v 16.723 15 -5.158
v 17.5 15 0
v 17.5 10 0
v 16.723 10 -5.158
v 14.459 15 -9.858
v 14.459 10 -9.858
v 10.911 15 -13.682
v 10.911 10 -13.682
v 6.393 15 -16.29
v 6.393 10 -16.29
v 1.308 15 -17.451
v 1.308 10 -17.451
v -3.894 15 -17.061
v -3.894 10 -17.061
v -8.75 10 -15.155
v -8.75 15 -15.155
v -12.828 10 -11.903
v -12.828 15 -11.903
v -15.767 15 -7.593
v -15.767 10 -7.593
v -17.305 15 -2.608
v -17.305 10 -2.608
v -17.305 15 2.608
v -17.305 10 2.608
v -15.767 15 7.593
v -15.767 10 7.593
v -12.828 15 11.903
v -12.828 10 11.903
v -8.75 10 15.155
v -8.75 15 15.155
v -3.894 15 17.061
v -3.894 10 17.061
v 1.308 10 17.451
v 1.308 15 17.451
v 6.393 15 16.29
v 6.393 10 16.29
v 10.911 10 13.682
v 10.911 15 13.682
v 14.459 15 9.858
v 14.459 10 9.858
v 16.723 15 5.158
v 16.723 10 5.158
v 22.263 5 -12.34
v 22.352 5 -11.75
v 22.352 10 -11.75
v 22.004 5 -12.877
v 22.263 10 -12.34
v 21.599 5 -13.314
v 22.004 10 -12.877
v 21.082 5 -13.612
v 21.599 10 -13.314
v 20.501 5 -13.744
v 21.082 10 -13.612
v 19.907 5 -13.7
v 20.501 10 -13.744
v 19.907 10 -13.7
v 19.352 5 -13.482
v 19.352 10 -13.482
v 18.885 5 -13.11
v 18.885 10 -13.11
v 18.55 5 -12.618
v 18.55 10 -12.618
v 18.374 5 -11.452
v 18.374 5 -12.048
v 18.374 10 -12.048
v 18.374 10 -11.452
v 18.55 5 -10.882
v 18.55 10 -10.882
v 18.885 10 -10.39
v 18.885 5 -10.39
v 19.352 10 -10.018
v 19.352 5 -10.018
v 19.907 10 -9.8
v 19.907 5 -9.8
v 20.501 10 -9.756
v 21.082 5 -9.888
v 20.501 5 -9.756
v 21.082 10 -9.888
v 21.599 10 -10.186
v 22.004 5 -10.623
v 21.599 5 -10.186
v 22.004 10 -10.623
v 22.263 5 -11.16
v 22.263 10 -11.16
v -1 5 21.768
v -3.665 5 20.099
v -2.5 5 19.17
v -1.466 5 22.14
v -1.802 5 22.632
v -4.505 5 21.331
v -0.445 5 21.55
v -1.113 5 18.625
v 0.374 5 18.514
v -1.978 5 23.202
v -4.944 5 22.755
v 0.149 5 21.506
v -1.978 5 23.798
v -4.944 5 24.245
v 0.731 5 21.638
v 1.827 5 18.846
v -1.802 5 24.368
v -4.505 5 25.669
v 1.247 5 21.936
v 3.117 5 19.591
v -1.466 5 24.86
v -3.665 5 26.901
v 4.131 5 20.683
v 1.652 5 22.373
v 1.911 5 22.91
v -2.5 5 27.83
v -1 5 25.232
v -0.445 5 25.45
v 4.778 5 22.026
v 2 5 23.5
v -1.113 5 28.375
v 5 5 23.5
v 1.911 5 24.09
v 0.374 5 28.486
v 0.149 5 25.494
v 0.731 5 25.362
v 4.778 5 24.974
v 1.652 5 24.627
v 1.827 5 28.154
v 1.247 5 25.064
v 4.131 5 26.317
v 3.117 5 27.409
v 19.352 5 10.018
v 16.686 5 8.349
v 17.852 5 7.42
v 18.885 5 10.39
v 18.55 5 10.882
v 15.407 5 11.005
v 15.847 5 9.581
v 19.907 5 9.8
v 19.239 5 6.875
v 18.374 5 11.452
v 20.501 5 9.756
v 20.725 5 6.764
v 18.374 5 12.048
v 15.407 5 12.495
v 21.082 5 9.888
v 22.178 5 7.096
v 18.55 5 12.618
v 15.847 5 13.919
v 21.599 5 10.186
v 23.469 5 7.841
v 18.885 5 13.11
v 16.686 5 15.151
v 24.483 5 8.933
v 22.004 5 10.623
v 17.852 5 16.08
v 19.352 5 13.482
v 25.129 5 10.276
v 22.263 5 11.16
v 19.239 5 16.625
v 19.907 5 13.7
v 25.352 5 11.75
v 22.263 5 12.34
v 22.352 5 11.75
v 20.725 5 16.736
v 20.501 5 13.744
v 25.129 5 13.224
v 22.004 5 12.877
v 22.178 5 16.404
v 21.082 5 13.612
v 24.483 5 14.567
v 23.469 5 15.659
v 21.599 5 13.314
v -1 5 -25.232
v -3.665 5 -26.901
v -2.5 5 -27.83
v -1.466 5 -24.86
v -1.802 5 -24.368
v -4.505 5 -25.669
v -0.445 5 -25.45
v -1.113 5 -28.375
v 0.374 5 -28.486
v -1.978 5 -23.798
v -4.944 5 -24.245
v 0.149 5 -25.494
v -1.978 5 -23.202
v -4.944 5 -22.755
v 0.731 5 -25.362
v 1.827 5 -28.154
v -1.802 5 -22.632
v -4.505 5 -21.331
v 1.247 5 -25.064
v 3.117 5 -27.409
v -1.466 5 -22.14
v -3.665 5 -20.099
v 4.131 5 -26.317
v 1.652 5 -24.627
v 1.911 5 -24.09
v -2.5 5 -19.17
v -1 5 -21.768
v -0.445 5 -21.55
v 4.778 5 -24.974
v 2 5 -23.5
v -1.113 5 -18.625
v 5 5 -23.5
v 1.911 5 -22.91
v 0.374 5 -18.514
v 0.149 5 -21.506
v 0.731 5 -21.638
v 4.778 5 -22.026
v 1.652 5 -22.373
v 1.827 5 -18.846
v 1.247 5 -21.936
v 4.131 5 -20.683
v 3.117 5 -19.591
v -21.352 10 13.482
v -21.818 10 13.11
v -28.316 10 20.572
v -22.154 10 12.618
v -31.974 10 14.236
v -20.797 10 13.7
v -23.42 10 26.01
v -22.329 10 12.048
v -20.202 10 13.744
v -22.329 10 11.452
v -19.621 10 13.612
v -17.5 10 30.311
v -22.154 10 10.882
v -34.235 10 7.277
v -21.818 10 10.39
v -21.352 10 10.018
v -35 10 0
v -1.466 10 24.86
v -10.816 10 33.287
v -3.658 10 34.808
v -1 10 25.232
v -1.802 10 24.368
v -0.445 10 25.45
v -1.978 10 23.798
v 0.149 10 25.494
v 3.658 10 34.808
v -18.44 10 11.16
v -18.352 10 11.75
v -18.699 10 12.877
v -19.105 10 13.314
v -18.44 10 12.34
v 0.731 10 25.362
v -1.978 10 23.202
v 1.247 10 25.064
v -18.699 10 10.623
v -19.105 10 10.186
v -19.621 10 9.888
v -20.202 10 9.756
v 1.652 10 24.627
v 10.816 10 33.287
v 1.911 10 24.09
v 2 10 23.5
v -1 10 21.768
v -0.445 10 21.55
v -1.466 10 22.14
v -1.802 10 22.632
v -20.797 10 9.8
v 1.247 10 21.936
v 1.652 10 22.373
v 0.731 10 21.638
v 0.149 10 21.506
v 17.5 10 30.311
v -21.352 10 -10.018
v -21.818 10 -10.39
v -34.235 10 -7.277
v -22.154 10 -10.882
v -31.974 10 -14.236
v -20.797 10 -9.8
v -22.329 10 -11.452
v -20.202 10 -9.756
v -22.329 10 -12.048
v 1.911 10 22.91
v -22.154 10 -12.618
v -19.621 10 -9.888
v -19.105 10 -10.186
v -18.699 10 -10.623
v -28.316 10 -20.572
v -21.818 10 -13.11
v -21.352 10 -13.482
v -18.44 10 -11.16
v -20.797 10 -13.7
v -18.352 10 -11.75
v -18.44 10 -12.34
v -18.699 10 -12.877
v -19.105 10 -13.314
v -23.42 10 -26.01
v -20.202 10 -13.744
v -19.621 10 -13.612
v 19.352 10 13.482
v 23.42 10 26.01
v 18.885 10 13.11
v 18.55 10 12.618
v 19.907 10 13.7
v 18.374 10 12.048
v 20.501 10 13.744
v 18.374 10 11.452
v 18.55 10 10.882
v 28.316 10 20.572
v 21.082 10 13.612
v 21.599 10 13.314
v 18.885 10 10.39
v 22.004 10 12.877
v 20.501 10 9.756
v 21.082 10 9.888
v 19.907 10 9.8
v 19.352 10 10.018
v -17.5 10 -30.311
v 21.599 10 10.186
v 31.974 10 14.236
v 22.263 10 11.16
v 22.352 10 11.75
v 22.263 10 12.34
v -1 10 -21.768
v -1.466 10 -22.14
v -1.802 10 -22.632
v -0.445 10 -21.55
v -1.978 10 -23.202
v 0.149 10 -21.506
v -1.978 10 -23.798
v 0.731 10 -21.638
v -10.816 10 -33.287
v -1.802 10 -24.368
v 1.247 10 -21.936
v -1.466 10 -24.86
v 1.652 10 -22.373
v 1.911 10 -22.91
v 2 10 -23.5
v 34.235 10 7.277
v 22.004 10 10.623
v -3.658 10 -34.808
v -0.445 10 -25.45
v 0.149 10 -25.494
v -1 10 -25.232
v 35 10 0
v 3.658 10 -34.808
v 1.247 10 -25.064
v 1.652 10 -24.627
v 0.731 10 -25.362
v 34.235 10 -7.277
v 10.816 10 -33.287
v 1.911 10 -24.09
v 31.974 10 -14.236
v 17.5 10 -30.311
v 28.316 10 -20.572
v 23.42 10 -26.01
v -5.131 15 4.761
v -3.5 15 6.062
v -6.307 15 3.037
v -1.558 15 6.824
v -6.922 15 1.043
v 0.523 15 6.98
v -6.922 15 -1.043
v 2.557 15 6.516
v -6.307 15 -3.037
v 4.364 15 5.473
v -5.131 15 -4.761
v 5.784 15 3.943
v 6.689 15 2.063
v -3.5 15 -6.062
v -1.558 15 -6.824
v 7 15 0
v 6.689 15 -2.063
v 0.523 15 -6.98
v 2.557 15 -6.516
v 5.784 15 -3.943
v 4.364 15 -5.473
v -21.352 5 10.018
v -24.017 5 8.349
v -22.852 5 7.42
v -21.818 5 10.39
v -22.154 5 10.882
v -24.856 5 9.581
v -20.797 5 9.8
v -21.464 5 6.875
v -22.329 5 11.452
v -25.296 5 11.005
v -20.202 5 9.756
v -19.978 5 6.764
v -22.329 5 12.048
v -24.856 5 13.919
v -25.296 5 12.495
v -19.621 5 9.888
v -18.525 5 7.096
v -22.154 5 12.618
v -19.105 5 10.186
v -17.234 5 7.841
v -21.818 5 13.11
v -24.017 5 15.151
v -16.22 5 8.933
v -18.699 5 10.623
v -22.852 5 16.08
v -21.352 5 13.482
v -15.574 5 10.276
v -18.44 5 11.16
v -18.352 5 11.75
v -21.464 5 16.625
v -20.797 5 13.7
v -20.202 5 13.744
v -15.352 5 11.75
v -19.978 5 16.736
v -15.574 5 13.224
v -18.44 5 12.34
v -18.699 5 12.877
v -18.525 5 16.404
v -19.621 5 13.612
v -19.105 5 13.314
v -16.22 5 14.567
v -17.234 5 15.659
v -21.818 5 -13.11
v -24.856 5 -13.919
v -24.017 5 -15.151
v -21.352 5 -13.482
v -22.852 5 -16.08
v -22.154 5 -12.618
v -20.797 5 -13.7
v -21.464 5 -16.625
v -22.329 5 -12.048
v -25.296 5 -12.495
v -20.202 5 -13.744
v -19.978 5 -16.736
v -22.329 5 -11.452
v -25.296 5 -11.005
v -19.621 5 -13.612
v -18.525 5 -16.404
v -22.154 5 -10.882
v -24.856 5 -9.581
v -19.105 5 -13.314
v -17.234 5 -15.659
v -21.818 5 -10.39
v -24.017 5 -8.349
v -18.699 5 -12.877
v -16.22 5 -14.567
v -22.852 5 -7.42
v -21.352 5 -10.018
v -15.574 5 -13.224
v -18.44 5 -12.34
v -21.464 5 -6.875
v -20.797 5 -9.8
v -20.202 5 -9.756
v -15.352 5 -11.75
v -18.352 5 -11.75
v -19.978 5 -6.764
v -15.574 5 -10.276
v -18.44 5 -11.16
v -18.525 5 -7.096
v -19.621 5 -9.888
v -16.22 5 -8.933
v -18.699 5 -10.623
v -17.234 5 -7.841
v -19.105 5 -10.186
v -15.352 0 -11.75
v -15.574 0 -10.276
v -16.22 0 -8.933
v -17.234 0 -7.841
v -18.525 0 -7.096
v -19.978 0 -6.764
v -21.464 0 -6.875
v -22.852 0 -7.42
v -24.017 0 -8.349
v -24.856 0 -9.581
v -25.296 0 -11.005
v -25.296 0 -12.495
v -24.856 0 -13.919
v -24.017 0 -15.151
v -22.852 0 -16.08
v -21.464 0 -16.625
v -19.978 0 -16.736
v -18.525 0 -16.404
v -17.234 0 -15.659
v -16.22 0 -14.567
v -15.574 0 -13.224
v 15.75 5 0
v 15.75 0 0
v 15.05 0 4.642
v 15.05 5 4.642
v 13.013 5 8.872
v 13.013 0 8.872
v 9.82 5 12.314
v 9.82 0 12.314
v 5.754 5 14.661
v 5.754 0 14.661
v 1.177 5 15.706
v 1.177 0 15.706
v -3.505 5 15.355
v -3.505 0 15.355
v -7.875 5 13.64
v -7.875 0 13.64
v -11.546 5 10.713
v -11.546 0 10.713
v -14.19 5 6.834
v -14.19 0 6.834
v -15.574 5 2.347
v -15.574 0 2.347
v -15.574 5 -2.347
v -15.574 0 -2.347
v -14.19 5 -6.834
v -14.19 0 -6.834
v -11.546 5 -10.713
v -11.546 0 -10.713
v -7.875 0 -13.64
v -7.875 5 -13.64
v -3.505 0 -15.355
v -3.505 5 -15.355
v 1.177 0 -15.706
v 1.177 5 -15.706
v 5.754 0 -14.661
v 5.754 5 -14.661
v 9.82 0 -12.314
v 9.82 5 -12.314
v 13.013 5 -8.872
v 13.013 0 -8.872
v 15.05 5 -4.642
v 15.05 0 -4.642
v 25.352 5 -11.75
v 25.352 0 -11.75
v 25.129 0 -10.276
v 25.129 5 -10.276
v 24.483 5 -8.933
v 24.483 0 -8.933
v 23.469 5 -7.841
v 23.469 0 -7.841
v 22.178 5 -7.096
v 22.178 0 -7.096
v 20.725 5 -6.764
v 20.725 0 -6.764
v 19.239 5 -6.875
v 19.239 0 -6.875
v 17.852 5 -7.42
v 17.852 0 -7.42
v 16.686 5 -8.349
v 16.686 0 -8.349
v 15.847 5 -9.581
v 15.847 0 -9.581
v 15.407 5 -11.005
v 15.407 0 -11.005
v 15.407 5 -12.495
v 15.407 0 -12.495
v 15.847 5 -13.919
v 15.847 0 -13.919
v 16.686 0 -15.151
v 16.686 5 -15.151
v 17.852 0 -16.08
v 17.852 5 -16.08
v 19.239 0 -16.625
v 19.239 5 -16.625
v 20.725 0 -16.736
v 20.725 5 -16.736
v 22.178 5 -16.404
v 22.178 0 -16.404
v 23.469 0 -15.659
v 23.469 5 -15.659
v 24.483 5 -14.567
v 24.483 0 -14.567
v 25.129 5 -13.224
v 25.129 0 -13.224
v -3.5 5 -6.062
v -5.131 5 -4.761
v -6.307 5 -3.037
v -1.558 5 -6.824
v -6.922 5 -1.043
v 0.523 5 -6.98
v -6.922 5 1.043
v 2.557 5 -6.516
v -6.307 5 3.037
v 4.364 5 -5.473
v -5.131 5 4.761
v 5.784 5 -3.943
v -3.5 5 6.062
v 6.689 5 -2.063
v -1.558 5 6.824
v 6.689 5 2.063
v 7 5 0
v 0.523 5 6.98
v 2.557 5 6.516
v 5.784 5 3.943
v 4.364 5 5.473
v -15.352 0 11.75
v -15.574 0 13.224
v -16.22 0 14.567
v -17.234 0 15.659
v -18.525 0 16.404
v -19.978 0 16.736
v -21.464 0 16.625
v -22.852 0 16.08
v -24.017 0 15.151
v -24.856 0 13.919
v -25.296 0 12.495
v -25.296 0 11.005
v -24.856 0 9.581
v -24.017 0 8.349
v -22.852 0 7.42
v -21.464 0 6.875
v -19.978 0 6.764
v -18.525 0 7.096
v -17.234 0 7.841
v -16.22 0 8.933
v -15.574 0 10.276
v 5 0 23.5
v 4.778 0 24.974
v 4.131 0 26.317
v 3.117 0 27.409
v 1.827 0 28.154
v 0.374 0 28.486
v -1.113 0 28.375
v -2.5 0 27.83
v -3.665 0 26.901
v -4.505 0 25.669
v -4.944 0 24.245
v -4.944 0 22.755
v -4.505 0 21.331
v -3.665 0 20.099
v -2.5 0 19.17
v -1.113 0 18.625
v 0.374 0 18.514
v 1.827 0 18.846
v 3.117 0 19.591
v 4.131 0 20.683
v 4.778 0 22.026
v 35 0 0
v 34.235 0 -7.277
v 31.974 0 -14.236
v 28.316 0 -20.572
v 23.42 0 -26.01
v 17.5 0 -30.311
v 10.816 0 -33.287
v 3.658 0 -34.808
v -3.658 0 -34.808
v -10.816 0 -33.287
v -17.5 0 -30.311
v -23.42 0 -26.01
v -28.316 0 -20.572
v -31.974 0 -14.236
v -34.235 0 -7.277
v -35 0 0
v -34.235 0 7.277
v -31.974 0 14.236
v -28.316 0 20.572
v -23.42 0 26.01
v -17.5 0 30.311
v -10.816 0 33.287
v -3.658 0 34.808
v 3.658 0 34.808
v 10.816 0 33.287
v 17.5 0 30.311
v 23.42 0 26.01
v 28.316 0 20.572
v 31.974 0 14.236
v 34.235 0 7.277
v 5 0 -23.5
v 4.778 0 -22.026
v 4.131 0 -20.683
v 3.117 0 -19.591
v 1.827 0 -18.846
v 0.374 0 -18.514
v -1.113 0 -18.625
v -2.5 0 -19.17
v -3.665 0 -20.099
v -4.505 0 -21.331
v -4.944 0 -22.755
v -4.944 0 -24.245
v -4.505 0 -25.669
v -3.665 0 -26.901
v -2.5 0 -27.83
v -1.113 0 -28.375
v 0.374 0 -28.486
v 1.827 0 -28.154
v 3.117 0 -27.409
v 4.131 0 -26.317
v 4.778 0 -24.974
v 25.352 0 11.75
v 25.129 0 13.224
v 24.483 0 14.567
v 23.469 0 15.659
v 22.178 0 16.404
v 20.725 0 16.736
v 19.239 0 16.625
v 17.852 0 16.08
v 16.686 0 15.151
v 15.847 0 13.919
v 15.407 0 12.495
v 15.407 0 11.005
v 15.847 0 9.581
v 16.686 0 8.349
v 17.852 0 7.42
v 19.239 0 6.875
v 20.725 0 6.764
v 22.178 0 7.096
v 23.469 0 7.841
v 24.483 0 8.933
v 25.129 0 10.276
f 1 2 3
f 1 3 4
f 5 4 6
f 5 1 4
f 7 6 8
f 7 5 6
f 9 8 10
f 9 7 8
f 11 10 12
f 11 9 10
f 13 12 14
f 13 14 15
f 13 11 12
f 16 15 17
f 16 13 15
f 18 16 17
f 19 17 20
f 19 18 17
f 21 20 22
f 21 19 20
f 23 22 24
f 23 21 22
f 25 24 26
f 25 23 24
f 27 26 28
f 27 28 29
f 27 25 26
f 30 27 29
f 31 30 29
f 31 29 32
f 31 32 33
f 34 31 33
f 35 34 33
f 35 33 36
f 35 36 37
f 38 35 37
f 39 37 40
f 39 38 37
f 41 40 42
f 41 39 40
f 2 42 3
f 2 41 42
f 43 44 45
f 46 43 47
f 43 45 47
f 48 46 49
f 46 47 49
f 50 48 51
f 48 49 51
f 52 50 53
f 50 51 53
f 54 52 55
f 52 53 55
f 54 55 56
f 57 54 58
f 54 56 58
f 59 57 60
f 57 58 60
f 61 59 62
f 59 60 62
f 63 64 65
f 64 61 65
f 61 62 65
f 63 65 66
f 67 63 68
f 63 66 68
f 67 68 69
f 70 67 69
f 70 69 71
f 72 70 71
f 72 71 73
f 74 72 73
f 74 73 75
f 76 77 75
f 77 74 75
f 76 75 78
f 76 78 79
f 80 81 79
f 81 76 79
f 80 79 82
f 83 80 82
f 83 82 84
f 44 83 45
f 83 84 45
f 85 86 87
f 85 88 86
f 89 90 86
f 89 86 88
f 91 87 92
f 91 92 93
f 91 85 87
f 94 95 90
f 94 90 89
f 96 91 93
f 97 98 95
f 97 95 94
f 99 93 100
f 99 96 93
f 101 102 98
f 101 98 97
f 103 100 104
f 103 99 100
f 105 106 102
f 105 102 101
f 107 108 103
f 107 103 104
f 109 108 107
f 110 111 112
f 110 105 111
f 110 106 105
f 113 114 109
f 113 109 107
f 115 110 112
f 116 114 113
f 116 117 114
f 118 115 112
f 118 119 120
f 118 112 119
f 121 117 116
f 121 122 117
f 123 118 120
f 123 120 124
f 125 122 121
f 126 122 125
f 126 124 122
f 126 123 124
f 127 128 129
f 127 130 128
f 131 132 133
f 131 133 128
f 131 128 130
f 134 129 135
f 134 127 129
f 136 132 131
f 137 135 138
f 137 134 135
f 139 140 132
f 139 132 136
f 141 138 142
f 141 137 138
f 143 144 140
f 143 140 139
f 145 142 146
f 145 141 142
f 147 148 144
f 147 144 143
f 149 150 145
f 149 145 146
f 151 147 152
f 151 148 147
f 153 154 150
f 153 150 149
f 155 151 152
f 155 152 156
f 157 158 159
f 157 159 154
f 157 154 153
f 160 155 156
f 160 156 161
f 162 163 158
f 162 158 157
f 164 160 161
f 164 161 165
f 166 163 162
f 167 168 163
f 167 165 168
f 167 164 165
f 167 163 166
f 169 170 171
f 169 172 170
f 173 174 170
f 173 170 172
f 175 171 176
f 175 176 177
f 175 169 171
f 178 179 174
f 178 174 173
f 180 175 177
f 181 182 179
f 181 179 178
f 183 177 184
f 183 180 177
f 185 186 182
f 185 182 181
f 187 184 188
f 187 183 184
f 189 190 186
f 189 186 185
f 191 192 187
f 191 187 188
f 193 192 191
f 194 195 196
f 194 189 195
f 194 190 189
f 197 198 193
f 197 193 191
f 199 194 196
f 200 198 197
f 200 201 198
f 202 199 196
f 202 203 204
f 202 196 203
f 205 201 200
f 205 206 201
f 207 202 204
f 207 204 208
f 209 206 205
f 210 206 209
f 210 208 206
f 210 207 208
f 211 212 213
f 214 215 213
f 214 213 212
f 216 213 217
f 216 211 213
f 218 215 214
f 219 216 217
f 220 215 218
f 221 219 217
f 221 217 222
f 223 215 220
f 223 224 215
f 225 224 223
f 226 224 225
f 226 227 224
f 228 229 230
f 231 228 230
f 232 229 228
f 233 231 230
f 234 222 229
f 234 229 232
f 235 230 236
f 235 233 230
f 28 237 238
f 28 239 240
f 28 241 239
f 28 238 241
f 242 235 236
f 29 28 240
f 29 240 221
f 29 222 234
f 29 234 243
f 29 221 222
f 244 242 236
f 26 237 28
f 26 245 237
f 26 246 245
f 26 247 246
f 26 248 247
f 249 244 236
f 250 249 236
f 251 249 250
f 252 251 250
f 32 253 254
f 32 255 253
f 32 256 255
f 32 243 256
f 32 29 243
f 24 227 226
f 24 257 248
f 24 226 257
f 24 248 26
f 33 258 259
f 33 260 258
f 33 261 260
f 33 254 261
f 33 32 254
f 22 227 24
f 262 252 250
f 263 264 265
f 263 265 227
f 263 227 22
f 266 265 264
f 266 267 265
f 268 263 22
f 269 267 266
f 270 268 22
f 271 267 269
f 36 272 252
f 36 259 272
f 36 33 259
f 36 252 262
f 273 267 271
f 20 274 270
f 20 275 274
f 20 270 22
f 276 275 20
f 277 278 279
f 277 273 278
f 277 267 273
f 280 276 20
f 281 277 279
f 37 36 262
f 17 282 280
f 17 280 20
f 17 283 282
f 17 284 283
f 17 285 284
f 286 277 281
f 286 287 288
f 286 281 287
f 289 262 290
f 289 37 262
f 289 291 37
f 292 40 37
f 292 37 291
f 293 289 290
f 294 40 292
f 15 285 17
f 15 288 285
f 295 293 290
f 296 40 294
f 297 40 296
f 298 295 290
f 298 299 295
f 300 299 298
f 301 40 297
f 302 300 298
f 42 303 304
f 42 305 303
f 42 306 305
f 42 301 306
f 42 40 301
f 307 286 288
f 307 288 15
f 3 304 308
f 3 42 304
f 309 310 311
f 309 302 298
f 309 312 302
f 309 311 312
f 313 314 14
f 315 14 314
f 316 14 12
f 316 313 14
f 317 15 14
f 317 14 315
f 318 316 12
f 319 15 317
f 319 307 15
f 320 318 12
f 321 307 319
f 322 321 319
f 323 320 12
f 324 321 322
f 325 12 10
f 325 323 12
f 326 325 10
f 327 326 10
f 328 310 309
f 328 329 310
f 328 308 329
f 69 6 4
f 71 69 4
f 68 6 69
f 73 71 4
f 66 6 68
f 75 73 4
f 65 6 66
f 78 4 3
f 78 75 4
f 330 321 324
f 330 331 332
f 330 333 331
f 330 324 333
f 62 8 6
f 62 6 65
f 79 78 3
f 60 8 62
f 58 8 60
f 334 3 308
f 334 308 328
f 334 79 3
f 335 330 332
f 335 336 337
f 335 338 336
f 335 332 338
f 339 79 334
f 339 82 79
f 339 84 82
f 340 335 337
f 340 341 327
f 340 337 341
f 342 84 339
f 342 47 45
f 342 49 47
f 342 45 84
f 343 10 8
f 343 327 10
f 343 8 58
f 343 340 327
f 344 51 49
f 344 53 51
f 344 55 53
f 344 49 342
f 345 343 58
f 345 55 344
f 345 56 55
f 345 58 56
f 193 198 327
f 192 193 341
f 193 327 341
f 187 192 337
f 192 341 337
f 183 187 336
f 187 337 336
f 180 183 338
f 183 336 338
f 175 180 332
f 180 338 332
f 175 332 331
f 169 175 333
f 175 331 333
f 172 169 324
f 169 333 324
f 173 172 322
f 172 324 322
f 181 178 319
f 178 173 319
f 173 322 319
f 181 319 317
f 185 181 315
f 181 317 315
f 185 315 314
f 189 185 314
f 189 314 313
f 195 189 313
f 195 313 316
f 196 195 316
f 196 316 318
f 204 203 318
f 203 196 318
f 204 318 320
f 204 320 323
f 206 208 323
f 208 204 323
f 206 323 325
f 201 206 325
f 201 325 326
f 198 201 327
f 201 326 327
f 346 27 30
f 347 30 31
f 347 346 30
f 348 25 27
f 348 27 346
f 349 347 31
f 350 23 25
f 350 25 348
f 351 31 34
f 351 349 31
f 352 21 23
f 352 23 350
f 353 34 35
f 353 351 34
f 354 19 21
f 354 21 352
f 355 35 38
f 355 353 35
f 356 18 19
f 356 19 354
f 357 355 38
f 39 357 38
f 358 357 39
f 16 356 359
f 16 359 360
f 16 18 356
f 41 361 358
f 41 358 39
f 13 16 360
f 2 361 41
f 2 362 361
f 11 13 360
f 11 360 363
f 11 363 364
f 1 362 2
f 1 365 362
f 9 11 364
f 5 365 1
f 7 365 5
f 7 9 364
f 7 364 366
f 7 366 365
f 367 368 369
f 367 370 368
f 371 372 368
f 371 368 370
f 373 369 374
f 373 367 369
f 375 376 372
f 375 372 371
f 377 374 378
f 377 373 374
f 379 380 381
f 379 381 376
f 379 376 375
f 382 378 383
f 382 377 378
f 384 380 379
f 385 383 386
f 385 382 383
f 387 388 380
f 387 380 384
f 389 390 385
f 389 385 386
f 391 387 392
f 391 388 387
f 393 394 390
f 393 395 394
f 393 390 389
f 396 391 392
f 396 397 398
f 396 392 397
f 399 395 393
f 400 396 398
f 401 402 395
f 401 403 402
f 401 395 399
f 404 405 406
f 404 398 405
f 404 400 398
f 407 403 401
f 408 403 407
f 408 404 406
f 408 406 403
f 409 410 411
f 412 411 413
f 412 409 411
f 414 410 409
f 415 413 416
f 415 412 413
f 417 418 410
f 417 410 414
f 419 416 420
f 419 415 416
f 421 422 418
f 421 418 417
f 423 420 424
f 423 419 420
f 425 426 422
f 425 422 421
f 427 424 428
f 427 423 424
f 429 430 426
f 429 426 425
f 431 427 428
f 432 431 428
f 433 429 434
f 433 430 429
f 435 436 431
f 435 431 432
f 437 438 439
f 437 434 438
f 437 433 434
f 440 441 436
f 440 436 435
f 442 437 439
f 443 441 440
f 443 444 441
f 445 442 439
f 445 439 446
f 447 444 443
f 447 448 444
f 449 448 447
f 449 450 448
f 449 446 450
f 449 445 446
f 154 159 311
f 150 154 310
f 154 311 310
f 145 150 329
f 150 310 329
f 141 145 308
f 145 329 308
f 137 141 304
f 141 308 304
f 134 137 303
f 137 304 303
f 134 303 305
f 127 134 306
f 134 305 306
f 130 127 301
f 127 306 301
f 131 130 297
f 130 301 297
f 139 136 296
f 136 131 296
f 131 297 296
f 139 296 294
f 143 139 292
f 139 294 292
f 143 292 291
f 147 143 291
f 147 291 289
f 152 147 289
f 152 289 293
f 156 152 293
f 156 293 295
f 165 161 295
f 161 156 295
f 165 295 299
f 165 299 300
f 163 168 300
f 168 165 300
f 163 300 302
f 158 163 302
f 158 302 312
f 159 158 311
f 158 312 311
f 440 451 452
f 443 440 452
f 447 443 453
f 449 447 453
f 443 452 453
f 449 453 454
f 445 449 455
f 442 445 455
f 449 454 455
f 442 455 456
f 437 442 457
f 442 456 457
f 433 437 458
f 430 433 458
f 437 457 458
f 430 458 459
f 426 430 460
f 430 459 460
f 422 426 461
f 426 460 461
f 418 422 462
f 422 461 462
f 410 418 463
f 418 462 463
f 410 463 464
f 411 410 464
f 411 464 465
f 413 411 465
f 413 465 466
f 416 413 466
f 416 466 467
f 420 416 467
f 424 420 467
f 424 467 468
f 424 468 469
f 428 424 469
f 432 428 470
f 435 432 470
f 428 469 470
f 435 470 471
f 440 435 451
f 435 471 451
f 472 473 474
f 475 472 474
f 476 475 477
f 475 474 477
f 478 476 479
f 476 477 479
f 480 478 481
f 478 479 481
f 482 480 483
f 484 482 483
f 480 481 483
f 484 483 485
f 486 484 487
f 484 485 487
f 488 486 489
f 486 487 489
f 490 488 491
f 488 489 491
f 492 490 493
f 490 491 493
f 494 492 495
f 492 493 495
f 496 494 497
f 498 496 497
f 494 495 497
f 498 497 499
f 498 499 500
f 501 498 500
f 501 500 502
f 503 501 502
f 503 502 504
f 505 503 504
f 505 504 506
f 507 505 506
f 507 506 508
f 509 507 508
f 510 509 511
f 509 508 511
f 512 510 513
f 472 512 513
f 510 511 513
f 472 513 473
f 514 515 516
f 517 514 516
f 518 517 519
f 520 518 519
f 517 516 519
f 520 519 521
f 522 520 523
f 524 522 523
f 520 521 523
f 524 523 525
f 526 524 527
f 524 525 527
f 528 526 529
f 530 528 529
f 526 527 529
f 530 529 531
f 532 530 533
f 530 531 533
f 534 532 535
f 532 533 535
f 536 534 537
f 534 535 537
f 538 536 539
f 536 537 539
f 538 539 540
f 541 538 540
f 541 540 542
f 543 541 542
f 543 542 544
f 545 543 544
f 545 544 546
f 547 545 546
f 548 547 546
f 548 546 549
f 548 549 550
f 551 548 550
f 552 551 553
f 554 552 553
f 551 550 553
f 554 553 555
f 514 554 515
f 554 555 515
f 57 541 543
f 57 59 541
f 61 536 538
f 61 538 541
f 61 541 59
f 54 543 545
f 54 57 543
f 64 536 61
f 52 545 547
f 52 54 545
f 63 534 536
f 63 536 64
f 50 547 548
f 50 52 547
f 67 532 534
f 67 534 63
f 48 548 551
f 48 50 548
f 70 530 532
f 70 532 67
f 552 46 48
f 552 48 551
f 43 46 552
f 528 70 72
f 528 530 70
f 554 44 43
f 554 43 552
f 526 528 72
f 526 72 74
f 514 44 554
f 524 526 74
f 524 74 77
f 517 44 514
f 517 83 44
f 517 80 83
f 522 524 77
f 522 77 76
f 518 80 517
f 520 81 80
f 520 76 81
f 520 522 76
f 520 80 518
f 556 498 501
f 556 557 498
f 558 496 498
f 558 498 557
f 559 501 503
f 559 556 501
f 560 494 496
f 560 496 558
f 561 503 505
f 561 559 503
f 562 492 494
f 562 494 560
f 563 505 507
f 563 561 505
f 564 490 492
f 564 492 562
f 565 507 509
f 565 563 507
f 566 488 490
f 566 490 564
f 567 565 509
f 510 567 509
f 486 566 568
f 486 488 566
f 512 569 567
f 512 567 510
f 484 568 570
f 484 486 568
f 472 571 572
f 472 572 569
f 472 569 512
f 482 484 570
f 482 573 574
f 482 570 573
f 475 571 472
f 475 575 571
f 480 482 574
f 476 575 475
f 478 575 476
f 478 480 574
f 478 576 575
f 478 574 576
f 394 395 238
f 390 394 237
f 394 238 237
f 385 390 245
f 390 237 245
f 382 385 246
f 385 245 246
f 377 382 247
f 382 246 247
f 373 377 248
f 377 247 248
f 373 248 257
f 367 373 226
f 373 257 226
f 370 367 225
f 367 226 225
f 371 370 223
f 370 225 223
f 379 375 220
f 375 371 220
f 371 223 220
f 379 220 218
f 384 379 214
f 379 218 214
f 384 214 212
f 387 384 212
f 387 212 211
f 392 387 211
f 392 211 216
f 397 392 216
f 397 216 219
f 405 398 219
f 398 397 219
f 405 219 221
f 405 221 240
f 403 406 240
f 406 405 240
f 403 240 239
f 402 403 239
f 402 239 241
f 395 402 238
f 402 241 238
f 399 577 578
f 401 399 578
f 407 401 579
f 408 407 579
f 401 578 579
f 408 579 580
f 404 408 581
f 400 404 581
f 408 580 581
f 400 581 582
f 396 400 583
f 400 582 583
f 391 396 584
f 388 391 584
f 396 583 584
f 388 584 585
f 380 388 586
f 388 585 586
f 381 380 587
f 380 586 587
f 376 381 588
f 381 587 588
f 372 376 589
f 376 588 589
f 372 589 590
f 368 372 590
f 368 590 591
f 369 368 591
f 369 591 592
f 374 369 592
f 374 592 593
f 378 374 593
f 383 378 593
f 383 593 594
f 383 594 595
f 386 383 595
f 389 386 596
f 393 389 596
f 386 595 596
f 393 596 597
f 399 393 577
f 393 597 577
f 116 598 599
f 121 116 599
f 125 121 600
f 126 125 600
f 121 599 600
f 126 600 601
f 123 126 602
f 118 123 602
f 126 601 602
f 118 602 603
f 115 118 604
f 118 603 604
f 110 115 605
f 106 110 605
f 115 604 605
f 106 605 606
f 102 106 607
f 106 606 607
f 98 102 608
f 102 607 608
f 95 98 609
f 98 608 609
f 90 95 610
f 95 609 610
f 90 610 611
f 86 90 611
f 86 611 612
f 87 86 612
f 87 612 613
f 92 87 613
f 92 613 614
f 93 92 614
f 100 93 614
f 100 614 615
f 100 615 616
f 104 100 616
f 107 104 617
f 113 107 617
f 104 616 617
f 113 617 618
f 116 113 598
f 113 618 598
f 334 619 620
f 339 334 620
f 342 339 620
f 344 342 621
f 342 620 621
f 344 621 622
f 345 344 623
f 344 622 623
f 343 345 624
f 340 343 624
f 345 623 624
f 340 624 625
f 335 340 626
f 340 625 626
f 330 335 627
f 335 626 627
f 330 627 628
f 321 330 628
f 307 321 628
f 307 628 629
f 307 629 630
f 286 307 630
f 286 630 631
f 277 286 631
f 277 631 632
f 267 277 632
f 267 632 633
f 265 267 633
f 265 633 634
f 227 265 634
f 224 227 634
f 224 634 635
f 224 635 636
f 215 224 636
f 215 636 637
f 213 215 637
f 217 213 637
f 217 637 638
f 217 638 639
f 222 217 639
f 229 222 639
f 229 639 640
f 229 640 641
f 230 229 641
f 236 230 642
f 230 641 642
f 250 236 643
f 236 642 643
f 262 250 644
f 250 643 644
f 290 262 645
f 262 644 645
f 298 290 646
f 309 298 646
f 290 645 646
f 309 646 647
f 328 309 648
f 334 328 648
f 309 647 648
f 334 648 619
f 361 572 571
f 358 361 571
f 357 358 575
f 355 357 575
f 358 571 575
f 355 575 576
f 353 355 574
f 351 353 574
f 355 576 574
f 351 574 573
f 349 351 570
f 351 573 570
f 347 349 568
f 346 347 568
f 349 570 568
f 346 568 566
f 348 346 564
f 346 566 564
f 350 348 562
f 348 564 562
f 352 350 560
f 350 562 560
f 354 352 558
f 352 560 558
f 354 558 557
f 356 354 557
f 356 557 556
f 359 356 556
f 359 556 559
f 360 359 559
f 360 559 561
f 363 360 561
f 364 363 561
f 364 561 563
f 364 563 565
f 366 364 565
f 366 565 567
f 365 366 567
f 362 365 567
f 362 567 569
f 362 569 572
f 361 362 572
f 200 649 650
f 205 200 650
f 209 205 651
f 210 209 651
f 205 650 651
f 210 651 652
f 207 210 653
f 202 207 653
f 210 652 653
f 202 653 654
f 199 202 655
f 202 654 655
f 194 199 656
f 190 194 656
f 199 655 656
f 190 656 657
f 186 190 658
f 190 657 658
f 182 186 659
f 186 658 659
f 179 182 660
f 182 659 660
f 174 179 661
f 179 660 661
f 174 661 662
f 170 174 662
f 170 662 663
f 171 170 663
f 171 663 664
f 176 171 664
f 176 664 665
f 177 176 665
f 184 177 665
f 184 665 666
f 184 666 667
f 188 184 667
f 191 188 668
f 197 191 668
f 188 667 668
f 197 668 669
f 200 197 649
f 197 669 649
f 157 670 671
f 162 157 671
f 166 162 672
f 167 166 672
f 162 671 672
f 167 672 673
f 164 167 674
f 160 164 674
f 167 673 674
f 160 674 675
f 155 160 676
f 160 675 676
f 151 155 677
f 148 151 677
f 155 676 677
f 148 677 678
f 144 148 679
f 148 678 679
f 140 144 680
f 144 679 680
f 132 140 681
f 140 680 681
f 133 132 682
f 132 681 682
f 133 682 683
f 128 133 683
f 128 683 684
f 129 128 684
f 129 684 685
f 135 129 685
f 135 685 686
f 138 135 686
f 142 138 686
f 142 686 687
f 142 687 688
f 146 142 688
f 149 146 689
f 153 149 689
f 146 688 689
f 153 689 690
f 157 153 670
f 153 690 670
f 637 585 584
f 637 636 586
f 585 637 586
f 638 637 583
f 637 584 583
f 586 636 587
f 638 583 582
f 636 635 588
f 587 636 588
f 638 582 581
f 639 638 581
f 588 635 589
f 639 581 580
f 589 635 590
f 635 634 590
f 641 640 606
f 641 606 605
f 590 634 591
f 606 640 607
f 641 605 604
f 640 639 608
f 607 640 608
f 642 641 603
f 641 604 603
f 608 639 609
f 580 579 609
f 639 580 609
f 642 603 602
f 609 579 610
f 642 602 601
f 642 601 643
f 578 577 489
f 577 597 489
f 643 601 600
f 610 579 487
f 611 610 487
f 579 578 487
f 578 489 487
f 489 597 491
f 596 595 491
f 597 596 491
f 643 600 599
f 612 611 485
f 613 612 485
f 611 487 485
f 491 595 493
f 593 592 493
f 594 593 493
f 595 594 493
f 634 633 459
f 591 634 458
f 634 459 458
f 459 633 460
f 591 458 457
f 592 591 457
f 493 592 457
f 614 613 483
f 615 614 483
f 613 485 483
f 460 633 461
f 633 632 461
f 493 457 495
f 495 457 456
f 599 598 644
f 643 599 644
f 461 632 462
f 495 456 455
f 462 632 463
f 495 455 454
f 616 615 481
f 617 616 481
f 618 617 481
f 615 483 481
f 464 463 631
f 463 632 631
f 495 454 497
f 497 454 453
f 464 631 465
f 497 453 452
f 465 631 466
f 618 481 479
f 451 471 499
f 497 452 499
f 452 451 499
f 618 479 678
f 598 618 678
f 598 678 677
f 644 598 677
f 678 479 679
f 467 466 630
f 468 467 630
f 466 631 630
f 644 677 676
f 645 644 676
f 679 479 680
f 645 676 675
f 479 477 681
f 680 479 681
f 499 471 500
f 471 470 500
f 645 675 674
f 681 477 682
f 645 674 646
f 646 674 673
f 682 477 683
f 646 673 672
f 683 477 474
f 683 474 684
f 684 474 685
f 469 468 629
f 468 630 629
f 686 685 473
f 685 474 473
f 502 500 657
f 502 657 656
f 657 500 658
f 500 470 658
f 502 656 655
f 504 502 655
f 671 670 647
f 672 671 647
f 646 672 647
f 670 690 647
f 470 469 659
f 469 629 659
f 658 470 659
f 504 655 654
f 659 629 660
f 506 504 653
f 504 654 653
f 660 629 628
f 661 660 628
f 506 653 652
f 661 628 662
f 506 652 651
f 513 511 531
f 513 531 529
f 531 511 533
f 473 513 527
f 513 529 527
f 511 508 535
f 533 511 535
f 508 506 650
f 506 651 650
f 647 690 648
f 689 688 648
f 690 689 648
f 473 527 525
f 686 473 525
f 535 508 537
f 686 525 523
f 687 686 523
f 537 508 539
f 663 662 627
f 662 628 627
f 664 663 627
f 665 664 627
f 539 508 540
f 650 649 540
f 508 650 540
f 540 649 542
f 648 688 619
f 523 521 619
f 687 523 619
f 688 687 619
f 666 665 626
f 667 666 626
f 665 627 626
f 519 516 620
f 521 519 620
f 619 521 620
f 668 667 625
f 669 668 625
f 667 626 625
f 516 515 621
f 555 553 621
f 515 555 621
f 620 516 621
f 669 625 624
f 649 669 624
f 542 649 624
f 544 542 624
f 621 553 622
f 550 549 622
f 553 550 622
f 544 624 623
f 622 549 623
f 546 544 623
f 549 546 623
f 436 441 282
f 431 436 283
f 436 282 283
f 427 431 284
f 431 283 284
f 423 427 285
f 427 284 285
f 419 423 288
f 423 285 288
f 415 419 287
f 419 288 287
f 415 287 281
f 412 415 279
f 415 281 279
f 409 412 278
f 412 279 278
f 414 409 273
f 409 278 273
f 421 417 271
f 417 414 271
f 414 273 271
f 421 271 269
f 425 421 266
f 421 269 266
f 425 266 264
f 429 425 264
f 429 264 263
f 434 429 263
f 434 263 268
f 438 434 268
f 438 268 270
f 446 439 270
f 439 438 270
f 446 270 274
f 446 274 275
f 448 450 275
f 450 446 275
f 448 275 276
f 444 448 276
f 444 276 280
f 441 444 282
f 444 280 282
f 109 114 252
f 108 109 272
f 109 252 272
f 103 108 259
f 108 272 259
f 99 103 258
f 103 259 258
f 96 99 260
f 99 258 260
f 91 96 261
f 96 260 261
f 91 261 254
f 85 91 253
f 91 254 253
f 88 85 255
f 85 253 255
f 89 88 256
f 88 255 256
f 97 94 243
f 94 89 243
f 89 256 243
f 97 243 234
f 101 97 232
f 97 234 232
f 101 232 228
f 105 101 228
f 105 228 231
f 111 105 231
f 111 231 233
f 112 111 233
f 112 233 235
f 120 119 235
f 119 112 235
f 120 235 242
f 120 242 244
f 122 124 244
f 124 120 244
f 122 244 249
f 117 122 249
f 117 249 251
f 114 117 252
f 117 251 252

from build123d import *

# Parameters (mm, degrees)
SKETCH1_R           = 35
BOSS_EXTRUDE1_DEPTH = 15
SKETCH3_R           = 15.75
CUT_EXTRUDE1_DEPTH  = 5
SKETCH4_R           = 7
CUT_EXTRUDE2_DEPTH  = 11
SKETCH5_R           = 35
SKETCH5_R_2         = 17.5
CUT_EXTRUDE3_DEPTH  = 5
SKETCH6_R           = 2
CUT_EXTRUDE4_DEPTH  = 11
SKETCH7_R           = 5
SKETCH7_R_2         = 2
CUT_EXTRUDE5_DEPTH  = 5


with BuildPart() as part:
    # Sketch1 → Boss-Extrude1 (new body)
    with BuildSketch(Plane(origin=(0, 0, 0), x_dir=(1, 0, 0), z_dir=(0, 1, 0))):
        Circle(SKETCH1_R)
    extrude(amount=BOSS_EXTRUDE1_DEPTH)

    # Sketch3 → Cut-Extrude1 (cut)
    with BuildSketch(Plane.XZ):
        Circle(SKETCH3_R)
    extrude(amount=-CUT_EXTRUDE1_DEPTH, mode=Mode.SUBTRACT)

    # Sketch4 → Cut-Extrude2 (cut, through all)
    with BuildSketch(Plane.XZ.offset(-5)):
        Circle(SKETCH4_R)
    extrude(amount=-CUT_EXTRUDE2_DEPTH, mode=Mode.SUBTRACT)

    # Sketch5 → Cut-Extrude3 (cut)
    with BuildSketch(Plane(origin=(0, 15, 0), x_dir=(1, 0, 0), z_dir=(0, 1, 0))):
        Circle(SKETCH5_R)
        Circle(SKETCH5_R_2, mode=Mode.SUBTRACT)
    extrude(amount=-CUT_EXTRUDE3_DEPTH, mode=Mode.SUBTRACT)

    # Sketch6 → Cut-Extrude4 (cut, through all)
    with BuildSketch(Plane(origin=(0, 10, 0), x_dir=(1, 0, 0), z_dir=(0, 1, 0))):
        with Locations((0, 23.5)):
            Circle(SKETCH6_R)
        with Locations((20.351596989, 11.75)):
            Circle(SKETCH6_R)
        with Locations((20.351596989, -11.75)):
            Circle(SKETCH6_R)
        with Locations((0, -23.5)):
            Circle(SKETCH6_R)
        with Locations((-20.351596989, -11.75)):
            Circle(SKETCH6_R)
        with Locations((-20.351596989, 11.75)):
            Circle(SKETCH6_R)
    extrude(amount=-CUT_EXTRUDE4_DEPTH, mode=Mode.SUBTRACT)

    # Sketch7 → Cut-Extrude5 (cut)
    with BuildSketch(Plane.XZ):
        with Locations((0, 23.5)):
            Circle(SKETCH7_R)
        with Locations((0, 23.5)):
            Circle(SKETCH7_R_2, mode=Mode.SUBTRACT)
        with Locations((20.351596989, 11.75)):
            Circle(SKETCH7_R)
        with Locations((20.351596989, 11.75)):
            Circle(SKETCH7_R_2, mode=Mode.SUBTRACT)
        with Locations((20.351596989, -11.75)):
            Circle(SKETCH7_R)
        with Locations((20.351596989, -11.75)):
            Circle(SKETCH7_R_2, mode=Mode.SUBTRACT)
        with Locations((0, -23.5)):
            Circle(SKETCH7_R)
        with Locations((0, -23.5)):
            Circle(SKETCH7_R_2, mode=Mode.SUBTRACT)
        with Locations((-20.351596989, -11.75)):
            Circle(SKETCH7_R)
        with Locations((-20.351596989, -11.75)):
            Circle(SKETCH7_R_2, mode=Mode.SUBTRACT)
        with Locations((-20.351596989, 11.75)):
            Circle(SKETCH7_R)
        with Locations((-20.351596989, 11.75)):
            Circle(SKETCH7_R_2, mode=Mode.SUBTRACT)
    extrude(amount=-CUT_EXTRUDE5_DEPTH, mode=Mode.SUBTRACT)


solid = part.part
